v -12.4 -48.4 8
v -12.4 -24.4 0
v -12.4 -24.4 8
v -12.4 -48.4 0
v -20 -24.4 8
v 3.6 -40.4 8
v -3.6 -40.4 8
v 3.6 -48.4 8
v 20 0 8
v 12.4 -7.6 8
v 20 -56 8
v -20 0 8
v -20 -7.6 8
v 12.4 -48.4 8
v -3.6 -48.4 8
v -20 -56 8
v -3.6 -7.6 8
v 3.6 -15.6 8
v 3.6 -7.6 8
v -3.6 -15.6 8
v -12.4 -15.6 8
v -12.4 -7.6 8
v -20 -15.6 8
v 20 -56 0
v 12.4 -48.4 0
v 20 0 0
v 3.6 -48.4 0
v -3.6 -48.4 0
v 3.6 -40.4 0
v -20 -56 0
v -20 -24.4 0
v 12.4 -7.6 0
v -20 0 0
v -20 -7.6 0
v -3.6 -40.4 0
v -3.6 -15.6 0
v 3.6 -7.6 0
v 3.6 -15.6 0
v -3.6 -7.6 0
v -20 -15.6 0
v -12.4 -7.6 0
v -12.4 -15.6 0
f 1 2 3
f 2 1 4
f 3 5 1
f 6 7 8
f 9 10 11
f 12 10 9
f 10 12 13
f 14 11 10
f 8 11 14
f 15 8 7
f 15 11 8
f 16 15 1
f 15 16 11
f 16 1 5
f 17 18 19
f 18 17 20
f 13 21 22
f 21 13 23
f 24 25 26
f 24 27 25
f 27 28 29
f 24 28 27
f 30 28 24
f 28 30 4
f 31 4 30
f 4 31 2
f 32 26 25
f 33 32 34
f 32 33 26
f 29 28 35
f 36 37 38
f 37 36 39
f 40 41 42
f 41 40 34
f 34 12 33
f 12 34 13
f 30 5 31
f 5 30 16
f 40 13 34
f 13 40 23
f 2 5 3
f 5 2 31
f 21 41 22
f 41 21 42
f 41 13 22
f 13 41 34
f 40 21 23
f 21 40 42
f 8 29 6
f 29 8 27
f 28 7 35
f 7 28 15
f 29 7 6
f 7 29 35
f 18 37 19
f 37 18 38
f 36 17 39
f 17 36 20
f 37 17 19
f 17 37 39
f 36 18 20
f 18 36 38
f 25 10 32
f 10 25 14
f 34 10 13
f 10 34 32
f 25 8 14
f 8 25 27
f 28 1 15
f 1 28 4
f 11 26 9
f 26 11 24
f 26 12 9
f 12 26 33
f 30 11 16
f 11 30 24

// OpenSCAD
difference() {
  translate([0.0000000000, -28.0000000000, 4.0000000000]) {
    scale([40.0000000000, 56.0000000000, 8.0000000000]) {
      translate([-0.5000000000, -0.5000000000, -0.5000000000]) {
        cube([1, 1, 1]);
      }
    }
  }
  difference() {
    translate([-3.8000016000, -27.9999180000, 4.0000000000]) {
      scale([32.4000000000, 40.8000000000, 8.0000000000]) {
        translate([-0.5000000000, -0.5000000000, -0.5000000000]) {
          cube([1, 1, 1]);
        }
      }
    }
    union() {
      union() {
        union() {
          translate([-16.2000000000, -36.4000000000, 4.0000000000]) {
            scale([7.6000000000, 24.0000000000, 8.0000000000]) {
              translate([-0.5000000000, -0.5000000000, -0.5000000000]) {
                cube([1, 1, 1]);
              }
            }
          }
          translate([-16.2000000000, -11.6000000000, 4.0000000000]) {
            scale([7.6000000000, 8.0000000000, 8.0000000000]) {
              translate([-0.5000000000, -0.5000000000, -0.5000000000]) {
                cube([1, 1, 1]);
              }
            }
          }
        }
        translate([0.0000000000, -44.4000000000, 4.0000000000]) {
          scale([7.2000000000, 8.0000000000, 8.0000000000]) {
            translate([-0.5000000000, -0.5000000000, -0.5000000000]) {
              cube([1, 1, 1]);
            }
          }
        }
      }
      translate([0.0000000000, -11.6000000000, 4.0000000000]) {
        scale([7.2000000000, 8.0000000000, 8.0000000000]) {
          translate([-0.5000000000, -0.5000000000, -0.5000000000]) {
            cube([1, 1, 1]);
          }
        }
      }
    }
  }
}
